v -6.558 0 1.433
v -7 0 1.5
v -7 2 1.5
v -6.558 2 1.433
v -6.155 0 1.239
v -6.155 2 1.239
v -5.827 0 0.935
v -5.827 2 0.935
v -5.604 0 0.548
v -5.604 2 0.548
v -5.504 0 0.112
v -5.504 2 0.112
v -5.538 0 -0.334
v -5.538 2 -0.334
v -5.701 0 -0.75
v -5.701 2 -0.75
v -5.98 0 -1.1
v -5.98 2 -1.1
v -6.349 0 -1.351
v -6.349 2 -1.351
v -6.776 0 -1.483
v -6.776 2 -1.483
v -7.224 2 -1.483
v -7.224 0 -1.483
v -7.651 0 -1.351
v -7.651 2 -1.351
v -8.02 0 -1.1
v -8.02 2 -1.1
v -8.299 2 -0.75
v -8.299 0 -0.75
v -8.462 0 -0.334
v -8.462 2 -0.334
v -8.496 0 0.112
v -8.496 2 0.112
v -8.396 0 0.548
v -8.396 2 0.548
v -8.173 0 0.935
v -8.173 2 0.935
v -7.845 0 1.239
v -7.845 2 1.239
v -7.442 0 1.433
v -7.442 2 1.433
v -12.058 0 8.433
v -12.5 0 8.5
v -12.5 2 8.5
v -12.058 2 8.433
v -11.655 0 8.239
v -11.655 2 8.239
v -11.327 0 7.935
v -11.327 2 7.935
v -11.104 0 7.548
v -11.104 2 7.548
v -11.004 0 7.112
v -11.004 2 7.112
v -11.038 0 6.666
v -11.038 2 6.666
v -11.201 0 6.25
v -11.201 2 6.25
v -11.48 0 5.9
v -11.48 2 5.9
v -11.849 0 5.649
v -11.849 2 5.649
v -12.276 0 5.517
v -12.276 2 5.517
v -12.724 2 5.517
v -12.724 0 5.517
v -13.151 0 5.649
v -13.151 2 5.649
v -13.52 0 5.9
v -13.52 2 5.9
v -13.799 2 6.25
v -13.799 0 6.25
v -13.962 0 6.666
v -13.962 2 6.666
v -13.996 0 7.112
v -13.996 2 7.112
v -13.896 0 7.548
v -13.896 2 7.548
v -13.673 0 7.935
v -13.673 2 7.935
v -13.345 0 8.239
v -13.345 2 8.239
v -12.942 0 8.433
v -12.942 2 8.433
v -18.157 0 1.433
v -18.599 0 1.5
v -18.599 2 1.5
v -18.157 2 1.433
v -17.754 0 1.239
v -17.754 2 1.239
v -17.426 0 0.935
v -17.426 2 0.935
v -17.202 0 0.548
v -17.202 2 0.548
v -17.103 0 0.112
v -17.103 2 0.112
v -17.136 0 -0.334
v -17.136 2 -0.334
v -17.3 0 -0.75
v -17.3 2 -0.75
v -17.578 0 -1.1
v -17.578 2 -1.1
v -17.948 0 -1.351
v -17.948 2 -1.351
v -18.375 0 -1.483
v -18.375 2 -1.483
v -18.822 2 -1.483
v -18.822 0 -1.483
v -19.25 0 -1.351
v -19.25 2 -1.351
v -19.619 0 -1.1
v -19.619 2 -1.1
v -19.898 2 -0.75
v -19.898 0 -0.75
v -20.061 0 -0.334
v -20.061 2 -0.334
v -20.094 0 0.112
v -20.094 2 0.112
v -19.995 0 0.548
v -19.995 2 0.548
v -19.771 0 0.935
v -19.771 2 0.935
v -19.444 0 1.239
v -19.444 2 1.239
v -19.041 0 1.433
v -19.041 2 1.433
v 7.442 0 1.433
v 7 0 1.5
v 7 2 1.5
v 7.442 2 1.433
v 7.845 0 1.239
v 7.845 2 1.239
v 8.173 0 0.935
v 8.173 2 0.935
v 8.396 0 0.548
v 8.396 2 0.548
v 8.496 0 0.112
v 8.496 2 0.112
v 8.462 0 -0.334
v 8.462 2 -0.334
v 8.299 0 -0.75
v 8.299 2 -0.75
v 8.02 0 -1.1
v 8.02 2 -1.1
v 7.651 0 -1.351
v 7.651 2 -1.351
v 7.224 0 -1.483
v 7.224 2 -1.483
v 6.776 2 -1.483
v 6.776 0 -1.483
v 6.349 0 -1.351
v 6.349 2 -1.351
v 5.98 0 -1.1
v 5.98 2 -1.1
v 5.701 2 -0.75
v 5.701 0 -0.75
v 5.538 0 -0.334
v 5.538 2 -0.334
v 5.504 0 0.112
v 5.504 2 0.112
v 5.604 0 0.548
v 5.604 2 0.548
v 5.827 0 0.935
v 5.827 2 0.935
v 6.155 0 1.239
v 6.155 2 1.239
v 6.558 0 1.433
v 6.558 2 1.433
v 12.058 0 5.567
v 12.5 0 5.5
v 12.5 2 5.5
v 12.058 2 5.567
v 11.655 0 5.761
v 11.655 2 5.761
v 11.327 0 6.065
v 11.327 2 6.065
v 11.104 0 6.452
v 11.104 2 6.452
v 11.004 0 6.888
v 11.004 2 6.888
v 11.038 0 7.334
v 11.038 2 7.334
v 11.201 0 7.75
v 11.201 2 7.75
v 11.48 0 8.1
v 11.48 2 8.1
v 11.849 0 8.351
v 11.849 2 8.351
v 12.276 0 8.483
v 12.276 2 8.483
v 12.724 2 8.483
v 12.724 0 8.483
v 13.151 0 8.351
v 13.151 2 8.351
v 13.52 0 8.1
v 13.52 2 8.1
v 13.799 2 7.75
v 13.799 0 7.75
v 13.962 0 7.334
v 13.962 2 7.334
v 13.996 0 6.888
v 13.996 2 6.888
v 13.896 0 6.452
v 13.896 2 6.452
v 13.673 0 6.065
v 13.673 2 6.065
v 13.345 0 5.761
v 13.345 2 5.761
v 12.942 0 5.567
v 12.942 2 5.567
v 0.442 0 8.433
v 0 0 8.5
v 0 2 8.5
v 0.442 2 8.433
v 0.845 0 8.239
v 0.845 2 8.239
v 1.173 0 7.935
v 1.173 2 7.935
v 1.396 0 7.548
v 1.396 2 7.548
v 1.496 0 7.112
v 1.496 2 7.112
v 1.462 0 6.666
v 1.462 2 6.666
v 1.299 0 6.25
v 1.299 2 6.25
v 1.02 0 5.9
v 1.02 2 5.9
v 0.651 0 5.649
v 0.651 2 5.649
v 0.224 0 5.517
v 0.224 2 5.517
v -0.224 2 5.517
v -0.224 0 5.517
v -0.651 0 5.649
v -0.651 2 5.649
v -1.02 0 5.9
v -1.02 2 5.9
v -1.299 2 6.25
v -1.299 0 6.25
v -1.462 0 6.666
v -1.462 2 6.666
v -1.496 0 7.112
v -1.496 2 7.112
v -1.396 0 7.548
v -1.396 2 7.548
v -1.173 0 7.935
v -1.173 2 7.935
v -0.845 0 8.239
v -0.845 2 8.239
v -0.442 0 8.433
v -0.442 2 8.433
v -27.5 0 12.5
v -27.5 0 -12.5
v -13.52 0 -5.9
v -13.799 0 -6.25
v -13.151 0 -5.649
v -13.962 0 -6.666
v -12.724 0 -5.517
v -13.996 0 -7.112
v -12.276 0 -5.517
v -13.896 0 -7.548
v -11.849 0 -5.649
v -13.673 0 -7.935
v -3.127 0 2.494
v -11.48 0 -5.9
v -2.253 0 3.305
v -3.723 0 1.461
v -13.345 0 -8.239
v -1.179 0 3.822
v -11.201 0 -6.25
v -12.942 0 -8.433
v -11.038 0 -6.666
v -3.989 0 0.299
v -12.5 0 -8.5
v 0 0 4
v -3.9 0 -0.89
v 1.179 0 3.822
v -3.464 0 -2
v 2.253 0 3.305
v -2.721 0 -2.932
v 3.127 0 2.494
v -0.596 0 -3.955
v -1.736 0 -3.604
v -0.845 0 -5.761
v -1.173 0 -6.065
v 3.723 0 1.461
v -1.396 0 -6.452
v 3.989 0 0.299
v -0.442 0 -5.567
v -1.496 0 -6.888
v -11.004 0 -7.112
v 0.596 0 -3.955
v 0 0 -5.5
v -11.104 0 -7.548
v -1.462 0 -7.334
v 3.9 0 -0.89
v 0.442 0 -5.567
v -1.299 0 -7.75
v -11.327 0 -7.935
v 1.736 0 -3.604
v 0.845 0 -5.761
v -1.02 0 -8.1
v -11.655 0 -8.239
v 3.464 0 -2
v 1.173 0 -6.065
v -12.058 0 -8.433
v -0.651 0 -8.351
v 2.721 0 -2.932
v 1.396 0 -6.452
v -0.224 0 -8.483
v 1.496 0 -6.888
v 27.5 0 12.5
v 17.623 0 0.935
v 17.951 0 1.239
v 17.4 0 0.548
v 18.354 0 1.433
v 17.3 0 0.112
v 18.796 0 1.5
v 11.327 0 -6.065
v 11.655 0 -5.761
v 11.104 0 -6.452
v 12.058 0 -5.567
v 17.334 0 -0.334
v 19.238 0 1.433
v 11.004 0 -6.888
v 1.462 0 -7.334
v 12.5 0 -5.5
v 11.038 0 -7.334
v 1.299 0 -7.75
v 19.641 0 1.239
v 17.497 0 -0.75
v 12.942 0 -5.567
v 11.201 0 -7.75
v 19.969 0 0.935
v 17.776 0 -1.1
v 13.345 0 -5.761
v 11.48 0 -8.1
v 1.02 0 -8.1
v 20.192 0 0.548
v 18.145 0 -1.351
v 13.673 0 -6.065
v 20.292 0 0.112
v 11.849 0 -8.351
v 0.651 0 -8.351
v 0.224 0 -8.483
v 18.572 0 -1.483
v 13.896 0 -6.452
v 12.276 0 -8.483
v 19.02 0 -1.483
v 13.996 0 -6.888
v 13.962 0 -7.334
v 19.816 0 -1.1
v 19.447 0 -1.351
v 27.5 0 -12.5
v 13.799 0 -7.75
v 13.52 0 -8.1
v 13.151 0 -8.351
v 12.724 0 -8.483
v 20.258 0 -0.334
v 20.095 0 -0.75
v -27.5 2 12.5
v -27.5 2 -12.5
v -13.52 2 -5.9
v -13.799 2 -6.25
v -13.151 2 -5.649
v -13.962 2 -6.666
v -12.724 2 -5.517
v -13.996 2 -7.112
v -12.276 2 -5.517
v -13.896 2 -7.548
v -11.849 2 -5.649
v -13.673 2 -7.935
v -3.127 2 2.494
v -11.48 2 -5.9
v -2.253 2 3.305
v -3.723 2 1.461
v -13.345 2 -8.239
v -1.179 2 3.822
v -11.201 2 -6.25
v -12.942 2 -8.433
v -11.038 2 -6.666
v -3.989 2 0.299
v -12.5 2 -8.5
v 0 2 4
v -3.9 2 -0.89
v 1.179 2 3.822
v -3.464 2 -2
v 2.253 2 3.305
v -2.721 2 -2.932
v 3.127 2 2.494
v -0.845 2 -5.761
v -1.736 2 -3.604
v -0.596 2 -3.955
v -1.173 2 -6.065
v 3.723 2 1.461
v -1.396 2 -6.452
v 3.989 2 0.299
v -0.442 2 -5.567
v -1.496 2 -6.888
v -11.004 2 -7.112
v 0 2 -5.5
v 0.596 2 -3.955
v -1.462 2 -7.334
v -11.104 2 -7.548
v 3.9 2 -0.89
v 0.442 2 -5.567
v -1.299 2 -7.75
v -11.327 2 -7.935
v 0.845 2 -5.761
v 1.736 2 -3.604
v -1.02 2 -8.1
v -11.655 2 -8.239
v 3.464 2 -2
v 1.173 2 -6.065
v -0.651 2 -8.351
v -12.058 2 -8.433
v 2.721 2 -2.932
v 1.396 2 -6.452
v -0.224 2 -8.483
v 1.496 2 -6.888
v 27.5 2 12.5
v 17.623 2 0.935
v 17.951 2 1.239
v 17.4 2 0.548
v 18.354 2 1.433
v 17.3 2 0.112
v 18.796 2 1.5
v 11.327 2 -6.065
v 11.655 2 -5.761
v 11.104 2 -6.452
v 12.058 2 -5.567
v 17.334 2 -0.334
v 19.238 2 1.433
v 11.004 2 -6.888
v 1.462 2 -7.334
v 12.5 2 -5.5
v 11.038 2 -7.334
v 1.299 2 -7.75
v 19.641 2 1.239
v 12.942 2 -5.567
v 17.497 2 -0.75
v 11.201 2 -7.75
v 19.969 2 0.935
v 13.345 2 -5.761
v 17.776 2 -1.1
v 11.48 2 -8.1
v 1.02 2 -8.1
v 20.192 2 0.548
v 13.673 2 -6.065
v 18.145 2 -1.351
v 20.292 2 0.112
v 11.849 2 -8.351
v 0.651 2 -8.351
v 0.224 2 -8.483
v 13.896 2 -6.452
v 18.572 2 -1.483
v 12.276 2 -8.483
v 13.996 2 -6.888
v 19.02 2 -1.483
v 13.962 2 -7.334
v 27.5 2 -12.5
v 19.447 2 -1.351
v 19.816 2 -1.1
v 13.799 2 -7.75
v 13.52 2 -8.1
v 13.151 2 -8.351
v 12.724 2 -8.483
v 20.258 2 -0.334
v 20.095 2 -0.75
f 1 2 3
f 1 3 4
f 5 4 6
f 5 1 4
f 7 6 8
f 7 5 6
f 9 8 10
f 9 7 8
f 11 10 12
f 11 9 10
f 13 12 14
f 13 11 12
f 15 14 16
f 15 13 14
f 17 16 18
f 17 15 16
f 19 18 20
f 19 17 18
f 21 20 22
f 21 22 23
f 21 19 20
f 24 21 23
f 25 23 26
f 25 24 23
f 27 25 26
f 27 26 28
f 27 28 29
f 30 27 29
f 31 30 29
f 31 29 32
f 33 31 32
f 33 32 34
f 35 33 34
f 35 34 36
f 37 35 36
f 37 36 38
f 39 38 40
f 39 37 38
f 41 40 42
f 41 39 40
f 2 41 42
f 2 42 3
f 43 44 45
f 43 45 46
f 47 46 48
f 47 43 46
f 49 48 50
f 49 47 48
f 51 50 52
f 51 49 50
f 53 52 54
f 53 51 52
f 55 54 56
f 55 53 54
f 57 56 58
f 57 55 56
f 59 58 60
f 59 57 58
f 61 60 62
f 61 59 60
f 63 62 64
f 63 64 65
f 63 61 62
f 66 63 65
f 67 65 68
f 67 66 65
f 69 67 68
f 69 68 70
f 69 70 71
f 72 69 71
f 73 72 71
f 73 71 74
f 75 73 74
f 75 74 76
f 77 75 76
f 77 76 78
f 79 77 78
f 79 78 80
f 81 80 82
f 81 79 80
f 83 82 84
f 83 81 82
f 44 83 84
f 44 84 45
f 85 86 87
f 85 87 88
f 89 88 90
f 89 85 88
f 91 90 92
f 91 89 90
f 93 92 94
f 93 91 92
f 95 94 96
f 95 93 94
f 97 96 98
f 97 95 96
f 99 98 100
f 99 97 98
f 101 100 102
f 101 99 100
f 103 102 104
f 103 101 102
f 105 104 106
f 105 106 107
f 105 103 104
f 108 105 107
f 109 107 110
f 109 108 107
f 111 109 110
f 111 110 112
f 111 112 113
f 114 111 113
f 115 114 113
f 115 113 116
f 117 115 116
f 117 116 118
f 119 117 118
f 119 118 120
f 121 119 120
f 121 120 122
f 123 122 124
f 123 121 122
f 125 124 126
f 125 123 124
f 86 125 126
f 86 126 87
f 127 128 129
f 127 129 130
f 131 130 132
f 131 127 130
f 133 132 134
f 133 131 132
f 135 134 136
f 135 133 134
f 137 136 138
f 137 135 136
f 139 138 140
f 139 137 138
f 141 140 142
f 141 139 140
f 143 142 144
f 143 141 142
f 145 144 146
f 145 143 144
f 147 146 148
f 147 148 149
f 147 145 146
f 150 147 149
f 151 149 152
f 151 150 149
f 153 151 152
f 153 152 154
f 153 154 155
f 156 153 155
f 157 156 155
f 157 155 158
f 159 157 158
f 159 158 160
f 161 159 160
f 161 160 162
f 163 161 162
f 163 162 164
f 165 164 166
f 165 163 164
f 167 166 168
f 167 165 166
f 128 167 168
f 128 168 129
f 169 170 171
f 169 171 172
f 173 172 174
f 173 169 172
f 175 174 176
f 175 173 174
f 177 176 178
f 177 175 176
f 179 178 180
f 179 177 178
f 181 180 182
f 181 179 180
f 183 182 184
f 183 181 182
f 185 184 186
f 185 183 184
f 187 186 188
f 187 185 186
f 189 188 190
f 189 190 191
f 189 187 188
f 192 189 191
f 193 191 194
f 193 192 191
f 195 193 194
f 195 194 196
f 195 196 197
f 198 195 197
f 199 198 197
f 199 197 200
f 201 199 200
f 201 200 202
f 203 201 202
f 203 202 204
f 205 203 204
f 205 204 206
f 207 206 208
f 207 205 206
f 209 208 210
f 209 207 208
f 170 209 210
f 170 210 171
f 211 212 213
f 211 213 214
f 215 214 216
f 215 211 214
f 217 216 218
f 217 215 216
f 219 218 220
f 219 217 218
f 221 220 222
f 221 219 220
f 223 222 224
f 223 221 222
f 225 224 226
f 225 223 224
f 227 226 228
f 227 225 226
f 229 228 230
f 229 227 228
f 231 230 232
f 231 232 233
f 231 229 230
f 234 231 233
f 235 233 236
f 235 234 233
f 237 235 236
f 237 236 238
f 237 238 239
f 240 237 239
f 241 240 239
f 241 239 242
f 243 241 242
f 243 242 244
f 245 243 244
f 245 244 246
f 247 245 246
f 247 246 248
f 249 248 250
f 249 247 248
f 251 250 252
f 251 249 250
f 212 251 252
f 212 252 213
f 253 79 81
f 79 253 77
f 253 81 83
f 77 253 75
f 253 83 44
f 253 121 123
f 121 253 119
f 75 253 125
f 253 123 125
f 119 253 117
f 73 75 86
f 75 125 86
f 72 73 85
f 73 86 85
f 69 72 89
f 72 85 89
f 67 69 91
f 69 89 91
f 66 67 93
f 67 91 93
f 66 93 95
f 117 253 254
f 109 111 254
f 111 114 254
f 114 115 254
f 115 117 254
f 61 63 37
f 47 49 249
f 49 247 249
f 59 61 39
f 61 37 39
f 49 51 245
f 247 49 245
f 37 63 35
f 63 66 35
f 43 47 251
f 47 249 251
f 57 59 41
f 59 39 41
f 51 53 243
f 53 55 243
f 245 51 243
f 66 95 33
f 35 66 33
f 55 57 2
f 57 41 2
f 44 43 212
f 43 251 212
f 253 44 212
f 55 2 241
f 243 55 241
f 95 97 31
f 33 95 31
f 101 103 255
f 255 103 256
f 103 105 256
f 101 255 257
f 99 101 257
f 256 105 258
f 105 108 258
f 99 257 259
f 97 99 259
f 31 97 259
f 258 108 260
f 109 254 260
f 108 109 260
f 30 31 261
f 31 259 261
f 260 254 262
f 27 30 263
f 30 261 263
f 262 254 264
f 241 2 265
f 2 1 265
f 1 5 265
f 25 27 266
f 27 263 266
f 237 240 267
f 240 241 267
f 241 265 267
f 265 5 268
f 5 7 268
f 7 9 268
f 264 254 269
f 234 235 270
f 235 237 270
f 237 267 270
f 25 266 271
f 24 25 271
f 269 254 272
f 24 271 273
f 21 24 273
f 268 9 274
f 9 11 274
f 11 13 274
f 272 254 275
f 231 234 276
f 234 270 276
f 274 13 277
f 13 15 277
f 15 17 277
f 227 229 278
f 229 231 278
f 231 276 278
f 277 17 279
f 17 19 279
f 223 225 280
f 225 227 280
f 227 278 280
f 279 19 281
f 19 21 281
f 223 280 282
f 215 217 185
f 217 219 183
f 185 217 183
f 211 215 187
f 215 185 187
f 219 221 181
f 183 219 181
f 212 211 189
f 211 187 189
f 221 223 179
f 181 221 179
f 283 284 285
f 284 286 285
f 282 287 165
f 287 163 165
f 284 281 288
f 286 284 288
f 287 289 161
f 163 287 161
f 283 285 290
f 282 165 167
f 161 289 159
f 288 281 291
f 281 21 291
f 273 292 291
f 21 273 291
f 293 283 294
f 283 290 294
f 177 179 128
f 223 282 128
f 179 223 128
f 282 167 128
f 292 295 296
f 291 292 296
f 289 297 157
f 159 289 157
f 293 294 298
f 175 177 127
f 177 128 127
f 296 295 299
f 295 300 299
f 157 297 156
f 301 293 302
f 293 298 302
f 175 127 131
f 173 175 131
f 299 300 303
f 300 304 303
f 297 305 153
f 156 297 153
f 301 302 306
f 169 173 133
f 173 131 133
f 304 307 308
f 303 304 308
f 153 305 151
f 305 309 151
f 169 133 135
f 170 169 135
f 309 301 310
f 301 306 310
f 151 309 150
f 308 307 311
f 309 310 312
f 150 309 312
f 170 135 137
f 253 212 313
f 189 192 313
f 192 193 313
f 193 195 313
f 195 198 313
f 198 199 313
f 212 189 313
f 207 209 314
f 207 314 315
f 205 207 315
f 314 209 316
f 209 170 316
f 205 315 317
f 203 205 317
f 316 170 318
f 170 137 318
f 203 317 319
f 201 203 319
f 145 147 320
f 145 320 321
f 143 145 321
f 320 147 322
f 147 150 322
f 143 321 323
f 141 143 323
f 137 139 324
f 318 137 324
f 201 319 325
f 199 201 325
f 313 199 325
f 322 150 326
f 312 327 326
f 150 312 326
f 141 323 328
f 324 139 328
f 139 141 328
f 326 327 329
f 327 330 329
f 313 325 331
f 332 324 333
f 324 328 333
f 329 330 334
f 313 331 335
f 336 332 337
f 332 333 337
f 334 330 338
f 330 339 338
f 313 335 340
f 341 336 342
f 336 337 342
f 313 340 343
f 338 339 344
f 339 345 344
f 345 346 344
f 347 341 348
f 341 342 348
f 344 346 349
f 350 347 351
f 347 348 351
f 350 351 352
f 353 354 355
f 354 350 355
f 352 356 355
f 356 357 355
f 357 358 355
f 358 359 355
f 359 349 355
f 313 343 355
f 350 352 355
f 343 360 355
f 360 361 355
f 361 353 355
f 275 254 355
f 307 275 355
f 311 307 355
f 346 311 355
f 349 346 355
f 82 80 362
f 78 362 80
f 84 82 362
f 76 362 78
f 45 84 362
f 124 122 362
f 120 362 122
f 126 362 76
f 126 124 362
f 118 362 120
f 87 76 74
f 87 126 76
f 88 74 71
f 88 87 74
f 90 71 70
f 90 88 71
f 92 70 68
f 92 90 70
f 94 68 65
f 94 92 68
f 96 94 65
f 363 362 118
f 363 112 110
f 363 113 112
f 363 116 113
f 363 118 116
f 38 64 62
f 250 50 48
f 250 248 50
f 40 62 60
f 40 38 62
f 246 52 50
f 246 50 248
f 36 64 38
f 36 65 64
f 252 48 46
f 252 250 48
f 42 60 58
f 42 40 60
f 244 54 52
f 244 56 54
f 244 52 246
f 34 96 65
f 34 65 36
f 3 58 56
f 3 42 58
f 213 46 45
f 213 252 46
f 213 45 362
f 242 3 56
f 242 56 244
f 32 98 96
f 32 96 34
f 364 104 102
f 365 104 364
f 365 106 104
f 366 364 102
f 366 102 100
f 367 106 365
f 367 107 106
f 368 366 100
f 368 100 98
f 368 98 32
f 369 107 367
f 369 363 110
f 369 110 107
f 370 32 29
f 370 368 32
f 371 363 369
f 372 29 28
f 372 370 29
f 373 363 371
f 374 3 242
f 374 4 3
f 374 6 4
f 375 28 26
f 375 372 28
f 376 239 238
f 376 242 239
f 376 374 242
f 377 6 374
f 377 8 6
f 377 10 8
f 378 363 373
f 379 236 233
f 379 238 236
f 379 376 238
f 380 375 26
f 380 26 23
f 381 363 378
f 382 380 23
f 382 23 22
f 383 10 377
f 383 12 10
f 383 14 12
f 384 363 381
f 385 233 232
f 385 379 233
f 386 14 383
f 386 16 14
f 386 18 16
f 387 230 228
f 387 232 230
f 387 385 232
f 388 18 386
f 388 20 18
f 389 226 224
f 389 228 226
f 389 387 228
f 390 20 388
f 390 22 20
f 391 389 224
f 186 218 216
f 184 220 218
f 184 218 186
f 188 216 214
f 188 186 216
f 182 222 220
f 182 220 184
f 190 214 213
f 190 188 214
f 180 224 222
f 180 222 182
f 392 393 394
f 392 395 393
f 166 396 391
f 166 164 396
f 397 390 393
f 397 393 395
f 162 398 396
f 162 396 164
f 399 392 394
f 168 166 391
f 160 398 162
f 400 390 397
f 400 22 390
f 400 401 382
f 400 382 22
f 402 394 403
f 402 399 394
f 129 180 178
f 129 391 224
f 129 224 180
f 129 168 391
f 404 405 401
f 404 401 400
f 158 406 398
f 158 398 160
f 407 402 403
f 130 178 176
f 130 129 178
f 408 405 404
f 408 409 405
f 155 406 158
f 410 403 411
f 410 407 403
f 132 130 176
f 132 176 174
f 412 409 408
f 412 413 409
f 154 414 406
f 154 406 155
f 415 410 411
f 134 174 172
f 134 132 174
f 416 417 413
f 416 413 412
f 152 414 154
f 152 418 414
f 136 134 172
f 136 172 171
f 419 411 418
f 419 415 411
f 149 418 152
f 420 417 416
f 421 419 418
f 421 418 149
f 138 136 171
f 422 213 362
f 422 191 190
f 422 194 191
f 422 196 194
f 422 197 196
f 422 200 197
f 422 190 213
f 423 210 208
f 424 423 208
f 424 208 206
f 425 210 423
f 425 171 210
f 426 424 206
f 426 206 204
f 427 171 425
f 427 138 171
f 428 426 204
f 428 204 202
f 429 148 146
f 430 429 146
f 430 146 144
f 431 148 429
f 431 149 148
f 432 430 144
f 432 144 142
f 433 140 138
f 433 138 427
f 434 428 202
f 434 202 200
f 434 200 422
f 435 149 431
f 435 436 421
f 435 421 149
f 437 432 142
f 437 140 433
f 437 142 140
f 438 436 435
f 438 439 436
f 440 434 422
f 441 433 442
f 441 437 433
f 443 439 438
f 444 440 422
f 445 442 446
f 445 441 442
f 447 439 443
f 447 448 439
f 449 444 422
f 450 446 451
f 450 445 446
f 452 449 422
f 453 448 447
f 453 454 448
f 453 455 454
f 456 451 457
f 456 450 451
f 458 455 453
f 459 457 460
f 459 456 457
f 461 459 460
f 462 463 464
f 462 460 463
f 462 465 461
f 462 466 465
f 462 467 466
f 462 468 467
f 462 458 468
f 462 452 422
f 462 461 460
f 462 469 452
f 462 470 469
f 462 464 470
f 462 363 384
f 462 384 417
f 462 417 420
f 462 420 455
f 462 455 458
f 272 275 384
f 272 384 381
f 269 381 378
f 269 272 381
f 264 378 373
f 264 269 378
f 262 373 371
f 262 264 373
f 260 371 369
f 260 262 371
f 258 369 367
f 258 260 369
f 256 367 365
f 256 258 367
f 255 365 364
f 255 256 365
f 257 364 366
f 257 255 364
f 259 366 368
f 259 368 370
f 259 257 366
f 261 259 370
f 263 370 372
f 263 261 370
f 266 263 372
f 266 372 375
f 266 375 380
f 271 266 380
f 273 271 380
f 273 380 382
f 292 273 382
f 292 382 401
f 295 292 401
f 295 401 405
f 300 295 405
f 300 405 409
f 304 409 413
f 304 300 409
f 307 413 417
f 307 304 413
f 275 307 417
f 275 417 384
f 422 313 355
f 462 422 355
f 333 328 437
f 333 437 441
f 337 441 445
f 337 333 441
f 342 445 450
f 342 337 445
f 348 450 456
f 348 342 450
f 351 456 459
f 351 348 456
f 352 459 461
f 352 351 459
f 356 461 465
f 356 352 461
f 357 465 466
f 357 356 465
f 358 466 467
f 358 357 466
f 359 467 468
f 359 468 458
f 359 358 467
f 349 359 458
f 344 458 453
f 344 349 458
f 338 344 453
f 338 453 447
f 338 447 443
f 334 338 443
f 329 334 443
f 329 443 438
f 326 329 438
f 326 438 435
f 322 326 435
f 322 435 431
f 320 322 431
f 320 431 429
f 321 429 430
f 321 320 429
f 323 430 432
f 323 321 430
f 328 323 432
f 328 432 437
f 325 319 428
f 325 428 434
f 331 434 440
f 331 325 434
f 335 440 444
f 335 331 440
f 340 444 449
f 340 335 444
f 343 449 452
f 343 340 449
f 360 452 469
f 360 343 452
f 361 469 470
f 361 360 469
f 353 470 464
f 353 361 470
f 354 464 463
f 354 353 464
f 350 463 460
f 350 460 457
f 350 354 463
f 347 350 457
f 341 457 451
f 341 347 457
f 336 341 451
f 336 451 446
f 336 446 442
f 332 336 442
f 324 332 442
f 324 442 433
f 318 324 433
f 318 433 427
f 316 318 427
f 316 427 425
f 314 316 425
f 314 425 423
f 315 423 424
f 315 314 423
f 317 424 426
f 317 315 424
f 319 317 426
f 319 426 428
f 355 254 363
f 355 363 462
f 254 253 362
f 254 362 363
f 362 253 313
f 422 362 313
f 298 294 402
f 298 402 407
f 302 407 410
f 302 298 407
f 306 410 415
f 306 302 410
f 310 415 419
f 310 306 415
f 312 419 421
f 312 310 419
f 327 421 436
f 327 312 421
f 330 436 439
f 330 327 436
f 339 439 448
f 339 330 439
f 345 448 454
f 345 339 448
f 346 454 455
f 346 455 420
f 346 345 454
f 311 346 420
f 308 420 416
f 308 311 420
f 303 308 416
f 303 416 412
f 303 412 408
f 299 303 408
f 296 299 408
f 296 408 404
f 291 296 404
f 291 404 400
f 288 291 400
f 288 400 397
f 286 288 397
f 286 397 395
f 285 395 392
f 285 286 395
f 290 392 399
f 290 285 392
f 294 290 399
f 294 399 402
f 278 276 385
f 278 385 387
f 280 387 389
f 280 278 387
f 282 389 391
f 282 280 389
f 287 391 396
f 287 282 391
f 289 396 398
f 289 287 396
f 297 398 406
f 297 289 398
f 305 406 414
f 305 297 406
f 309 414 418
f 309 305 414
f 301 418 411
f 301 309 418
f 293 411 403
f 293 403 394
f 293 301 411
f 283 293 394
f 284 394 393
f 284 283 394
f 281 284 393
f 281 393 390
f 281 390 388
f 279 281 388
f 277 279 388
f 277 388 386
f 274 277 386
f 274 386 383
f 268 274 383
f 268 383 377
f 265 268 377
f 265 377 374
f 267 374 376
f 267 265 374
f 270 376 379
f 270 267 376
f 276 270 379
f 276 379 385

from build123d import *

# Parameters (mm, degrees)
SKETCH_1_W      = 55
SKETCH_1_H      = 25
SKETCH_1_R      = 1.5
SKETCH_1_R_2    = 4
EXTRUDE_1_DEPTH = 2


with BuildPart() as part:
    # 草图1 → 凸台-拉伸1 (new body)
    with BuildSketch(Plane(origin=(0, 0, 0), x_dir=(1, 0, 0), z_dir=(0, 1, 0))):
        Rectangle(SKETCH_1_W, SKETCH_1_H)
        with Locations(Location((0, 7, 0), (0, 0, 270))):
            Circle(SKETCH_1_R, mode=Mode.SUBTRACT)
        with Locations(Location((7, 0, 0), (0, 0, 270))):
            Circle(SKETCH_1_R, mode=Mode.SUBTRACT)
        with Locations(Location((0, -7, 0), (0, 0, 270))):
            Circle(SKETCH_1_R, mode=Mode.SUBTRACT)
        with Locations(Location((-7, 0, 0), (0, 0, 270))):
            Circle(SKETCH_1_R, mode=Mode.SUBTRACT)
        with Locations(Location((-18.598687937, 0, 0), (0, 0, 270))):
            Circle(SKETCH_1_R, mode=Mode.SUBTRACT)
        with Locations(Location((0, 0, 0), (0, 0, 270))):
            Circle(SKETCH_1_R_2, mode=Mode.SUBTRACT)
        with Locations(Location((18.795941944, 0, 0), (0, 0, 270))):
            Circle(SKETCH_1_R, mode=Mode.SUBTRACT)
        with Locations(Location((12.5, 7, 0), (0, 0, 270))):
            Circle(SKETCH_1_R, mode=Mode.SUBTRACT)
        with Locations(Location((12.5, -7, 0), (0, 0, 90))):
            Circle(SKETCH_1_R, mode=Mode.SUBTRACT)
        with Locations(Location((-12.5, -7, 0), (0, 0, 270))):
            Circle(SKETCH_1_R, mode=Mode.SUBTRACT)
        with Locations(Location((-12.5, 7, 0), (0, 0, 90))):
            Circle(SKETCH_1_R, mode=Mode.SUBTRACT)
    extrude(amount=EXTRUDE_1_DEPTH)


solid = part.part
